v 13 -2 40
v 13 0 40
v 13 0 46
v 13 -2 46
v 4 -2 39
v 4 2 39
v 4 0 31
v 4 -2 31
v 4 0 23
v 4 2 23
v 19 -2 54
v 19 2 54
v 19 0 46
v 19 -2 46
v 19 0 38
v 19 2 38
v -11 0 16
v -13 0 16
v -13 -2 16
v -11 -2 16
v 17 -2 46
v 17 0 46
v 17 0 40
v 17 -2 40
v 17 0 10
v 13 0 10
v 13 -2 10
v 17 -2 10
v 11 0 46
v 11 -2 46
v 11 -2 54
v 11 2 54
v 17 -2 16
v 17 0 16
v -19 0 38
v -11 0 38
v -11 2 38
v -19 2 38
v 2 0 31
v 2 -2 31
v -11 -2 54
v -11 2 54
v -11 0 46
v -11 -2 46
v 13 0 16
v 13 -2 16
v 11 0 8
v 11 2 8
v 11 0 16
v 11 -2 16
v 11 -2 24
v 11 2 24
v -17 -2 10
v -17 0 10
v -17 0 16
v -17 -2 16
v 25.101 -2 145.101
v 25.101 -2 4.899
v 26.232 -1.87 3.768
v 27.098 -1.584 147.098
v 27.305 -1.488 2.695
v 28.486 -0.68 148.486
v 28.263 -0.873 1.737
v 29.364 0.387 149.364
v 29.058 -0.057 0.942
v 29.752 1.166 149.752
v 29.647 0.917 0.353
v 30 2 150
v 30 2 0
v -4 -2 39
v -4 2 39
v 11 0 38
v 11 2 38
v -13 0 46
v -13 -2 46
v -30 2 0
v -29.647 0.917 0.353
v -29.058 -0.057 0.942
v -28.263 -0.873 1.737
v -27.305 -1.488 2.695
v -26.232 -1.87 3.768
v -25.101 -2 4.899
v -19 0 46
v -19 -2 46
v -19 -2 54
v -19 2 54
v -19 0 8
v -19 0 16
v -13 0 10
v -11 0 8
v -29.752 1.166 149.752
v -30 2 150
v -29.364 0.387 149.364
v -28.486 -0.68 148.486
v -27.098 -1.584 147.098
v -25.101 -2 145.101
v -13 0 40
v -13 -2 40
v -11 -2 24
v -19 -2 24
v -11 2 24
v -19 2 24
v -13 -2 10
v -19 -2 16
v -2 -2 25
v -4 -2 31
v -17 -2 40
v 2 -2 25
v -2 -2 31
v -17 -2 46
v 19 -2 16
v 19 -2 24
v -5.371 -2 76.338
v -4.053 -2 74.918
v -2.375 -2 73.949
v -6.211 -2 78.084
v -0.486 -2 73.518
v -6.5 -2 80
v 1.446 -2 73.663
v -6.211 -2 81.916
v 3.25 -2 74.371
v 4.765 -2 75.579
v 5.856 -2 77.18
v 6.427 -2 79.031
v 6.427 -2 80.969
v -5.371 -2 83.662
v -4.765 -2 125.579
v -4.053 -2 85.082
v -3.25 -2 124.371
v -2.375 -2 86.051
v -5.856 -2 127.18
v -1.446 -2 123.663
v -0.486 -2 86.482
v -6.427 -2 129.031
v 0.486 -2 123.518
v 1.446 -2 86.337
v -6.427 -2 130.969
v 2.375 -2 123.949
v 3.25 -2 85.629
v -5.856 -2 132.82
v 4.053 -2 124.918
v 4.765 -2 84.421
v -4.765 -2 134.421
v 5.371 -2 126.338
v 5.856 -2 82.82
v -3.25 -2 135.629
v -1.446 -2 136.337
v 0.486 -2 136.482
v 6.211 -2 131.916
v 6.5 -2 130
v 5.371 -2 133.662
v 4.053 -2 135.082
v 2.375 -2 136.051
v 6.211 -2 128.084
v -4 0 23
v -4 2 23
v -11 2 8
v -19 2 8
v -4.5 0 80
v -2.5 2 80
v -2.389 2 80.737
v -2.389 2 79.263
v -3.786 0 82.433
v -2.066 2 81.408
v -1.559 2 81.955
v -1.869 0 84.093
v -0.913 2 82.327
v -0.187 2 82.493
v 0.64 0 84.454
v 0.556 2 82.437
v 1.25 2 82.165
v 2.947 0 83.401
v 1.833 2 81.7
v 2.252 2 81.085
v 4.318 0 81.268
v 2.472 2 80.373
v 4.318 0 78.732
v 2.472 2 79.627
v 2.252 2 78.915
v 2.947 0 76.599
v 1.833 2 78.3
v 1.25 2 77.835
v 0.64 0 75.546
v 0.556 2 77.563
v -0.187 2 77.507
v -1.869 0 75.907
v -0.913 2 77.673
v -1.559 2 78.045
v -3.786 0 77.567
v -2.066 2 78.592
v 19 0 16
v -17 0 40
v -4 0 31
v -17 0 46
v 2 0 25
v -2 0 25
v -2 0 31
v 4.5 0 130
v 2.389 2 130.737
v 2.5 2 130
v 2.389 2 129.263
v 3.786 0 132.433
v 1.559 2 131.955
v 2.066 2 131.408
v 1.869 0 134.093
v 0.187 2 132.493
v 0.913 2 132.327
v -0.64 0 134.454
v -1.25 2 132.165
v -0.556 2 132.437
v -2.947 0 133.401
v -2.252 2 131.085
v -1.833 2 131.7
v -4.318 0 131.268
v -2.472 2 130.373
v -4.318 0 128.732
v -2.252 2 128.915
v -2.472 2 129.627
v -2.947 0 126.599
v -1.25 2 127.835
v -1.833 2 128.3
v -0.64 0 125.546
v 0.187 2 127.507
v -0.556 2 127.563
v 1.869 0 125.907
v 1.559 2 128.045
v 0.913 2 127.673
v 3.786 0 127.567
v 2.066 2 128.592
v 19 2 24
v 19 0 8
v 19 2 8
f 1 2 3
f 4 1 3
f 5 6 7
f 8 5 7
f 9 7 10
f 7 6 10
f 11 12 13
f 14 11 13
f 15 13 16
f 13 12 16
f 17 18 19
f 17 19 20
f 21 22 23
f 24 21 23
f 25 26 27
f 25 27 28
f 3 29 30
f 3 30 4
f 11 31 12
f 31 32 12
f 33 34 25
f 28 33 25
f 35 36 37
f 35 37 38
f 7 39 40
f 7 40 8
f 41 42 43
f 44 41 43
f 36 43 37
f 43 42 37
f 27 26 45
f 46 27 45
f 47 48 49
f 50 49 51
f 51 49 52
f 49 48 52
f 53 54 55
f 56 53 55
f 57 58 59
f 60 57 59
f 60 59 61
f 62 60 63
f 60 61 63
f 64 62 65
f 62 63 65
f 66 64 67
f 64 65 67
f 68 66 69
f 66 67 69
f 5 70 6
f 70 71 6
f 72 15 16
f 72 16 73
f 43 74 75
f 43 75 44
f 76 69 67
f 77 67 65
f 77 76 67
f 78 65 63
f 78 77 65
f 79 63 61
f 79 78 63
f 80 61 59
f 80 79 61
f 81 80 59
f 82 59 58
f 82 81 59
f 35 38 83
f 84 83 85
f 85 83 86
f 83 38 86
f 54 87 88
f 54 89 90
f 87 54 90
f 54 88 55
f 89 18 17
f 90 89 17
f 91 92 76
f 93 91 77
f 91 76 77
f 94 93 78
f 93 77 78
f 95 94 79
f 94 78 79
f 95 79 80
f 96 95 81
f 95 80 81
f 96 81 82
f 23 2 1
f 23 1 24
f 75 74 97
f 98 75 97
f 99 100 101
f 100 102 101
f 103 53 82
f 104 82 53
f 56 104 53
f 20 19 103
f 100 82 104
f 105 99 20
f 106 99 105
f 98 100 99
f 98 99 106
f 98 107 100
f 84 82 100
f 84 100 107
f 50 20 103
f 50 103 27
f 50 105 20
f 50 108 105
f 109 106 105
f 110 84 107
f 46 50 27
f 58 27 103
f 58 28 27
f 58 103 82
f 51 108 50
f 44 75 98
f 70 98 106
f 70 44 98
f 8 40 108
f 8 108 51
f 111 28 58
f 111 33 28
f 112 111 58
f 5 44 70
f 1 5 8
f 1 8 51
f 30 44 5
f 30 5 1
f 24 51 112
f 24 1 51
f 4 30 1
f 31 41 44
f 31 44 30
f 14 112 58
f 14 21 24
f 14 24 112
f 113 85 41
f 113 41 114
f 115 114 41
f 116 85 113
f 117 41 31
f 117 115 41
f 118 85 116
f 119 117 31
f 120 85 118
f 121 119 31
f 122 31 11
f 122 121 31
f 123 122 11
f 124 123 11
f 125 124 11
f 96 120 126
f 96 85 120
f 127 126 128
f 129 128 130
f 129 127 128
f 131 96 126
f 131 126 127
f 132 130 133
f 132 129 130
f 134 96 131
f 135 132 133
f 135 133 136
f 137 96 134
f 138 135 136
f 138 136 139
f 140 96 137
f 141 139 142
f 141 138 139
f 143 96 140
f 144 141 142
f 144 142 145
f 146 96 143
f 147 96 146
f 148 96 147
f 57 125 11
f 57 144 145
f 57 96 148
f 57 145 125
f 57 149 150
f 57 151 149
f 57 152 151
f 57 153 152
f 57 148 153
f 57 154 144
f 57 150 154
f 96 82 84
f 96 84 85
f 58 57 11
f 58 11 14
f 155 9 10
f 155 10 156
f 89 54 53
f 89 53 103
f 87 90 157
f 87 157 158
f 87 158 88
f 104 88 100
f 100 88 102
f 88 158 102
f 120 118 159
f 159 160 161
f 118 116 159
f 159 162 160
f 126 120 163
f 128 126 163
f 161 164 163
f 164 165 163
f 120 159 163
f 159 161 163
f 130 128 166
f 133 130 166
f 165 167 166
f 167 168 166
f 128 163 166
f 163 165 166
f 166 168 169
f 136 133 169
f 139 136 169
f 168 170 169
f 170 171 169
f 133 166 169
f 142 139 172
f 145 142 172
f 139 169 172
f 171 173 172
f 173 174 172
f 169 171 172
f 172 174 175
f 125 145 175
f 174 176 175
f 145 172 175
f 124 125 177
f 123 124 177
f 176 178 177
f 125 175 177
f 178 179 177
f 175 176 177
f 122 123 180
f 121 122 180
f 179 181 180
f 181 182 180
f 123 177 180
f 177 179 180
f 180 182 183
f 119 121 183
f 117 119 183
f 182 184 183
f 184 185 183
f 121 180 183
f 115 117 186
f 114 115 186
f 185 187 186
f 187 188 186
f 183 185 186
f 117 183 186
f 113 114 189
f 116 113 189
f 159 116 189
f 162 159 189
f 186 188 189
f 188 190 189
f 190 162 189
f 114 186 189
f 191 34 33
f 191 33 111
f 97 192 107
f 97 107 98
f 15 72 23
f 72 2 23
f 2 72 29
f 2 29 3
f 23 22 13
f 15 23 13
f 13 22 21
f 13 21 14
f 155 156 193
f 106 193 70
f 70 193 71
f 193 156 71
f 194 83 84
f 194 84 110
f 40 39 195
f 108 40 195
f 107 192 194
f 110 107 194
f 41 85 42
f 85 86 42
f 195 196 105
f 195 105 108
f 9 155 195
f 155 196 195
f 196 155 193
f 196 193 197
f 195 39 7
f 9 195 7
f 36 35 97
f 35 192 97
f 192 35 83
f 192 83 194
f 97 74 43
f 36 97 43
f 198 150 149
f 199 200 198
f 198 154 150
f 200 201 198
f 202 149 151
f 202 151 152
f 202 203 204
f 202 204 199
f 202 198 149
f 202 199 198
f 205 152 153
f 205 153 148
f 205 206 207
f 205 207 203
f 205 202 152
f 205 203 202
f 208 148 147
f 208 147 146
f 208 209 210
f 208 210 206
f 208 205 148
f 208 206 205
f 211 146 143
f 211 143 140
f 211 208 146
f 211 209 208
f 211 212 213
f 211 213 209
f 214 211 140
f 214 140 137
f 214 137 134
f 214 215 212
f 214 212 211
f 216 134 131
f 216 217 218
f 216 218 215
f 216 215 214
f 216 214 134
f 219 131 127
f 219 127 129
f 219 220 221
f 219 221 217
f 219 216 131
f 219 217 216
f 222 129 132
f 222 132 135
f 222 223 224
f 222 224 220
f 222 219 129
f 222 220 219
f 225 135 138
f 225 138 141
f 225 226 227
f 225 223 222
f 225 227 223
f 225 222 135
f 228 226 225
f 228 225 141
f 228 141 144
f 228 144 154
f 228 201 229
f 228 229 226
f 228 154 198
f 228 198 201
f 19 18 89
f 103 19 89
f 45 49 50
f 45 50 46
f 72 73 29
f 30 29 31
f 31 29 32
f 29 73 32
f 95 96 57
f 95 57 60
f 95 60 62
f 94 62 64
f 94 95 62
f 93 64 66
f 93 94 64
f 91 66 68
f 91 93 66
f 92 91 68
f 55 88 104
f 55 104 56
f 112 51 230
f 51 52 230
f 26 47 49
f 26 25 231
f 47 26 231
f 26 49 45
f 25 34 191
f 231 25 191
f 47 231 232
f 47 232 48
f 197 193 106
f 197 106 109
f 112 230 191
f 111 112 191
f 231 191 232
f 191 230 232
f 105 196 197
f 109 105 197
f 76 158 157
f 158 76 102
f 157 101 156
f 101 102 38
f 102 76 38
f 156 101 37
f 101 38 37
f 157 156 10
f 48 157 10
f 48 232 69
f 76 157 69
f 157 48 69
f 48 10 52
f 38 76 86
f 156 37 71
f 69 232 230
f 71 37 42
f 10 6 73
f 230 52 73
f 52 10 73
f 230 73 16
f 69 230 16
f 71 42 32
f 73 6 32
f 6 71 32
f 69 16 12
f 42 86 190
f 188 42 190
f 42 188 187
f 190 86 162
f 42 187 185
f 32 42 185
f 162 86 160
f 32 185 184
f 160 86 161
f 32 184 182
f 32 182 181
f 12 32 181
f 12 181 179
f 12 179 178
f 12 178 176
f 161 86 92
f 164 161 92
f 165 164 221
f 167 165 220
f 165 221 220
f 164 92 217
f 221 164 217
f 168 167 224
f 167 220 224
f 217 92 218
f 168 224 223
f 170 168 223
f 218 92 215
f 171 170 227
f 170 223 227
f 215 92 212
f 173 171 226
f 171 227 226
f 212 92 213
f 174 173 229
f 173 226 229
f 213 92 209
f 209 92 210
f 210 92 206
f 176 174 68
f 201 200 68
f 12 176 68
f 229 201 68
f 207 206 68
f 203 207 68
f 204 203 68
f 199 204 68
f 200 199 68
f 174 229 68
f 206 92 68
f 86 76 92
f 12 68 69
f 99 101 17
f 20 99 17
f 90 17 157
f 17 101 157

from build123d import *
from build123d import SkipClean  # not in build123d's __all__

# Parameters (mm, degrees)
F0_R        = 1.5
F1_DEPTH    = 2
F0_W        = 2
F0_H        = 6
F0_H_2      = 2
F0_W_2      = 4
F2_DEPTH    = 2
F4_T1_DEPTH = 84.4948974279
F4_T3_DEPTH = 174.4948974279


# Not quite as in the source:
# - a fillet or chamfer that OpenCascade refuses, or shapes differently, is made with other operations: its cross-section is extruded or revolved along the edge and cut away or added


with BuildPart() as f1:
    # F0 (on Front) → F1 (new body)
    with BuildSketch(Plane.XZ):
        with BuildLine():
            Line((-30, 150), (-30, 80))
            Line((-30, 80), (-1.5, 80))
            ThreePointArc((-1.5, 80), (0, 81.5), (1.5, 80))
            Line((1.5, 80), (30, 80))
            Line((30, 80), (30, 150))
            Line((30, 150), (-30, 150))
        make_face()
        with Locations((0, 130)):
            Circle(F0_R, mode=Mode.SUBTRACT)
        with BuildLine():
            Line((-30, 0), (0, 0))
            Line((0, 0), (30, 0))
            Line((30, 0), (30, 80))
            Line((30, 80), (1.5, 80))
            ThreePointArc((1.5, 80), (0, 78.5), (-1.5, 80))
            Line((-1.5, 80), (-30, 80))
            Line((-30, 80), (-30, 0))
        make_face()
        Polygon((-11, 24), (-11, 16), (-11, 10), (-11, 8), (-13, 8), (-17, 8), (-19, 8), (-19, 10), (-19, 16), (-19, 24), align=None, mode=Mode.SUBTRACT)
        Polygon((-11, 48), (-11, 46), (-11, 40), (-11, 38), (-13, 38), (-17, 38), (-19, 38), (-19, 40), (-19, 46), (-19, 48), (-19, 54), (-11, 54), align=None, mode=Mode.SUBTRACT)
        Polygon((4, 39), (4, 31), (4, 25), (4, 23), (2, 23), (-2, 23), (-4, 23), (-4, 25), (-4, 31), (-4, 39), align=None, mode=Mode.SUBTRACT)
        Polygon((19, 24), (19, 16), (19, 10), (19, 8), (17, 8), (13, 8), (11, 8), (11, 10), (11, 16), (11, 24), align=None, mode=Mode.SUBTRACT)
        Polygon((19, 54), (19, 46), (19, 40), (19, 38), (17, 38), (13, 38), (11, 38), (11, 40), (11, 46), (11, 54), align=None, mode=Mode.SUBTRACT)
    extrude(amount=-F1_DEPTH)

    # F0 (on Front) → F2 (join)
    with BuildSketch(Plane.XZ):
        with BuildLine():
            Line((-30, 0), (0, 0))
            Line((0, 0), (30, 0))
            Line((30, 0), (30, 80))
            Line((30, 80), (1.5, 80))
            ThreePointArc((1.5, 80), (0, 78.5), (-1.5, 80))
            Line((-1.5, 80), (-30, 80))
            Line((-30, 80), (-30, 0))
        make_face()
        Polygon((-11, 24), (-11, 16), (-11, 10), (-11, 8), (-13, 8), (-17, 8), (-19, 8), (-19, 10), (-19, 16), (-19, 24), align=None, mode=Mode.SUBTRACT)
        Polygon((-11, 48), (-11, 46), (-11, 40), (-11, 38), (-13, 38), (-17, 38), (-19, 38), (-19, 40), (-19, 46), (-19, 48), (-19, 54), (-11, 54), align=None, mode=Mode.SUBTRACT)
        Polygon((4, 39), (4, 31), (4, 25), (4, 23), (2, 23), (-2, 23), (-4, 23), (-4, 25), (-4, 31), (-4, 39), align=None, mode=Mode.SUBTRACT)
        Polygon((19, 24), (19, 16), (19, 10), (19, 8), (17, 8), (13, 8), (11, 8), (11, 10), (11, 16), (11, 24), align=None, mode=Mode.SUBTRACT)
        Polygon((19, 54), (19, 46), (19, 40), (19, 38), (17, 38), (13, 38), (11, 38), (11, 40), (11, 46), (11, 54), align=None, mode=Mode.SUBTRACT)
        with BuildLine():
            Line((-30, 150), (-30, 80))
            Line((-30, 80), (-1.5, 80))
            ThreePointArc((-1.5, 80), (0, 81.5), (1.5, 80))
            Line((1.5, 80), (30, 80))
            Line((30, 80), (30, 150))
            Line((30, 150), (-30, 150))
        make_face()
        with Locations((0, 130)):
            Circle(F0_R, mode=Mode.SUBTRACT)
        with Locations((-12, 43)):
            Rectangle(F0_W, F0_H)
        with Locations((-12, 39)):
            Rectangle(F0_W, F0_H_2)
        with Locations((-18, 43)):
            Rectangle(F0_W, F0_H)
        with Locations((-15, 39)):
            Rectangle(F0_W_2, F0_H_2)
        with Locations((-18, 39)):
            Rectangle(F0_W, F0_H_2)
        with Locations((18, 43)):
            Rectangle(F0_W, F0_H)
        with Locations((18, 39)):
            Rectangle(F0_W, F0_H_2)
        with Locations((12, 43)):
            Rectangle(F0_W, F0_H)
        with Locations((15, 39)):
            Rectangle(F0_W_2, F0_H_2)
        with Locations((12, 39)):
            Rectangle(F0_W, F0_H_2)
        with Locations((3, 28)):
            Rectangle(F0_W, F0_H)
        with Locations((3, 24)):
            Rectangle(F0_W, F0_H_2)
        with Locations((-3, 28)):
            Rectangle(F0_W, F0_H)
        with Locations((0, 24)):
            Rectangle(F0_W_2, F0_H_2)
        with Locations((-3, 24)):
            Rectangle(F0_W, F0_H_2)
        with Locations((-12, 13)):
            Rectangle(F0_W, F0_H)
        with Locations((-12, 9)):
            Rectangle(F0_W, F0_H_2)
        with Locations((-18, 13)):
            Rectangle(F0_W, F0_H)
        with Locations((-15, 9)):
            Rectangle(F0_W_2, F0_H_2)
        with Locations((-18, 9)):
            Rectangle(F0_W, F0_H_2)
        with Locations((18, 13)):
            Rectangle(F0_W, F0_H)
        with Locations((18, 9)):
            Rectangle(F0_W, F0_H_2)
        with Locations((12, 13)):
            Rectangle(F0_W, F0_H)
        with Locations((15, 9)):
            Rectangle(F0_W_2, F0_H_2)
        with Locations((12, 9)):
            Rectangle(F0_W, F0_H_2)
    with SkipClean():  # cleaning this boolean's faces spoils the solid; the shape is the same uncleaned
        extrude(amount=F2_DEPTH)

    # F3: chamfer of 5 on 2 edges, made by hand

    # F3_s1 → F3_t2 (revolve, cut)
    with BuildSketch(Plane.XY.offset(130)):
        Polygon((6.5, -2), (1.5, 3), (1.5, -2), align=None)
    revolve(axis=Axis((0, -2, 130), (0, -1, 0)), mode=Mode.SUBTRACT)

    # F3_s3 → F3_t4 (revolve, cut)
    with BuildSketch(Plane.XY.offset(80)):
        Polygon((-6.5, -2), (-1.5, 3), (-1.5, -2), align=None)
    revolve(axis=Axis((0, -2, 80), (0, 1, 0)), mode=Mode.SUBTRACT)

    # F4: fillet of radius 5 on 4 edges, made by hand

    # F4_s2 → F4_t1 (cut)
    with BuildSketch(Plane.YZ.offset(-42.2474487139)):
        with BuildLine():
            ThreePointArc((2, 0), (-0.8729833462, 1.7367018254), (-2, 4.8989794856))
            Line((-2, 4.8989794856), (-2, 0))
            Line((-2, 0), (2, 0))
        make_face()
        with BuildLine():
            ThreePointArc((-2, 145.1010205144), (-0.8729833462, 148.2632981746), (2, 150))
            Line((2, 150), (-2, 150))
            Line((-2, 150), (-2, 145.1010205144))
        make_face()
    extrude(amount=F4_T1_DEPTH, mode=Mode.SUBTRACT)

    # F4_s4 → F4_t3 (cut)
    with BuildSketch(Plane.XY.offset(-12.2474487139)):
        with BuildLine():
            ThreePointArc((-30, 2), (-28.2632981746, -0.8729833462), (-25.1010205144, -2))
            Line((-25.1010205144, -2), (-30, -2))
            Line((-30, -2), (-30, 2))
        make_face()
        with BuildLine():
            ThreePointArc((25.1010205144, -2), (28.2632981746, -0.8729833462), (30, 2))
            Line((30, 2), (30, -2))
            Line((30, -2), (25.1010205144, -2))
        make_face()
    extrude(amount=F4_T3_DEPTH, mode=Mode.SUBTRACT)


solid = f1.part
